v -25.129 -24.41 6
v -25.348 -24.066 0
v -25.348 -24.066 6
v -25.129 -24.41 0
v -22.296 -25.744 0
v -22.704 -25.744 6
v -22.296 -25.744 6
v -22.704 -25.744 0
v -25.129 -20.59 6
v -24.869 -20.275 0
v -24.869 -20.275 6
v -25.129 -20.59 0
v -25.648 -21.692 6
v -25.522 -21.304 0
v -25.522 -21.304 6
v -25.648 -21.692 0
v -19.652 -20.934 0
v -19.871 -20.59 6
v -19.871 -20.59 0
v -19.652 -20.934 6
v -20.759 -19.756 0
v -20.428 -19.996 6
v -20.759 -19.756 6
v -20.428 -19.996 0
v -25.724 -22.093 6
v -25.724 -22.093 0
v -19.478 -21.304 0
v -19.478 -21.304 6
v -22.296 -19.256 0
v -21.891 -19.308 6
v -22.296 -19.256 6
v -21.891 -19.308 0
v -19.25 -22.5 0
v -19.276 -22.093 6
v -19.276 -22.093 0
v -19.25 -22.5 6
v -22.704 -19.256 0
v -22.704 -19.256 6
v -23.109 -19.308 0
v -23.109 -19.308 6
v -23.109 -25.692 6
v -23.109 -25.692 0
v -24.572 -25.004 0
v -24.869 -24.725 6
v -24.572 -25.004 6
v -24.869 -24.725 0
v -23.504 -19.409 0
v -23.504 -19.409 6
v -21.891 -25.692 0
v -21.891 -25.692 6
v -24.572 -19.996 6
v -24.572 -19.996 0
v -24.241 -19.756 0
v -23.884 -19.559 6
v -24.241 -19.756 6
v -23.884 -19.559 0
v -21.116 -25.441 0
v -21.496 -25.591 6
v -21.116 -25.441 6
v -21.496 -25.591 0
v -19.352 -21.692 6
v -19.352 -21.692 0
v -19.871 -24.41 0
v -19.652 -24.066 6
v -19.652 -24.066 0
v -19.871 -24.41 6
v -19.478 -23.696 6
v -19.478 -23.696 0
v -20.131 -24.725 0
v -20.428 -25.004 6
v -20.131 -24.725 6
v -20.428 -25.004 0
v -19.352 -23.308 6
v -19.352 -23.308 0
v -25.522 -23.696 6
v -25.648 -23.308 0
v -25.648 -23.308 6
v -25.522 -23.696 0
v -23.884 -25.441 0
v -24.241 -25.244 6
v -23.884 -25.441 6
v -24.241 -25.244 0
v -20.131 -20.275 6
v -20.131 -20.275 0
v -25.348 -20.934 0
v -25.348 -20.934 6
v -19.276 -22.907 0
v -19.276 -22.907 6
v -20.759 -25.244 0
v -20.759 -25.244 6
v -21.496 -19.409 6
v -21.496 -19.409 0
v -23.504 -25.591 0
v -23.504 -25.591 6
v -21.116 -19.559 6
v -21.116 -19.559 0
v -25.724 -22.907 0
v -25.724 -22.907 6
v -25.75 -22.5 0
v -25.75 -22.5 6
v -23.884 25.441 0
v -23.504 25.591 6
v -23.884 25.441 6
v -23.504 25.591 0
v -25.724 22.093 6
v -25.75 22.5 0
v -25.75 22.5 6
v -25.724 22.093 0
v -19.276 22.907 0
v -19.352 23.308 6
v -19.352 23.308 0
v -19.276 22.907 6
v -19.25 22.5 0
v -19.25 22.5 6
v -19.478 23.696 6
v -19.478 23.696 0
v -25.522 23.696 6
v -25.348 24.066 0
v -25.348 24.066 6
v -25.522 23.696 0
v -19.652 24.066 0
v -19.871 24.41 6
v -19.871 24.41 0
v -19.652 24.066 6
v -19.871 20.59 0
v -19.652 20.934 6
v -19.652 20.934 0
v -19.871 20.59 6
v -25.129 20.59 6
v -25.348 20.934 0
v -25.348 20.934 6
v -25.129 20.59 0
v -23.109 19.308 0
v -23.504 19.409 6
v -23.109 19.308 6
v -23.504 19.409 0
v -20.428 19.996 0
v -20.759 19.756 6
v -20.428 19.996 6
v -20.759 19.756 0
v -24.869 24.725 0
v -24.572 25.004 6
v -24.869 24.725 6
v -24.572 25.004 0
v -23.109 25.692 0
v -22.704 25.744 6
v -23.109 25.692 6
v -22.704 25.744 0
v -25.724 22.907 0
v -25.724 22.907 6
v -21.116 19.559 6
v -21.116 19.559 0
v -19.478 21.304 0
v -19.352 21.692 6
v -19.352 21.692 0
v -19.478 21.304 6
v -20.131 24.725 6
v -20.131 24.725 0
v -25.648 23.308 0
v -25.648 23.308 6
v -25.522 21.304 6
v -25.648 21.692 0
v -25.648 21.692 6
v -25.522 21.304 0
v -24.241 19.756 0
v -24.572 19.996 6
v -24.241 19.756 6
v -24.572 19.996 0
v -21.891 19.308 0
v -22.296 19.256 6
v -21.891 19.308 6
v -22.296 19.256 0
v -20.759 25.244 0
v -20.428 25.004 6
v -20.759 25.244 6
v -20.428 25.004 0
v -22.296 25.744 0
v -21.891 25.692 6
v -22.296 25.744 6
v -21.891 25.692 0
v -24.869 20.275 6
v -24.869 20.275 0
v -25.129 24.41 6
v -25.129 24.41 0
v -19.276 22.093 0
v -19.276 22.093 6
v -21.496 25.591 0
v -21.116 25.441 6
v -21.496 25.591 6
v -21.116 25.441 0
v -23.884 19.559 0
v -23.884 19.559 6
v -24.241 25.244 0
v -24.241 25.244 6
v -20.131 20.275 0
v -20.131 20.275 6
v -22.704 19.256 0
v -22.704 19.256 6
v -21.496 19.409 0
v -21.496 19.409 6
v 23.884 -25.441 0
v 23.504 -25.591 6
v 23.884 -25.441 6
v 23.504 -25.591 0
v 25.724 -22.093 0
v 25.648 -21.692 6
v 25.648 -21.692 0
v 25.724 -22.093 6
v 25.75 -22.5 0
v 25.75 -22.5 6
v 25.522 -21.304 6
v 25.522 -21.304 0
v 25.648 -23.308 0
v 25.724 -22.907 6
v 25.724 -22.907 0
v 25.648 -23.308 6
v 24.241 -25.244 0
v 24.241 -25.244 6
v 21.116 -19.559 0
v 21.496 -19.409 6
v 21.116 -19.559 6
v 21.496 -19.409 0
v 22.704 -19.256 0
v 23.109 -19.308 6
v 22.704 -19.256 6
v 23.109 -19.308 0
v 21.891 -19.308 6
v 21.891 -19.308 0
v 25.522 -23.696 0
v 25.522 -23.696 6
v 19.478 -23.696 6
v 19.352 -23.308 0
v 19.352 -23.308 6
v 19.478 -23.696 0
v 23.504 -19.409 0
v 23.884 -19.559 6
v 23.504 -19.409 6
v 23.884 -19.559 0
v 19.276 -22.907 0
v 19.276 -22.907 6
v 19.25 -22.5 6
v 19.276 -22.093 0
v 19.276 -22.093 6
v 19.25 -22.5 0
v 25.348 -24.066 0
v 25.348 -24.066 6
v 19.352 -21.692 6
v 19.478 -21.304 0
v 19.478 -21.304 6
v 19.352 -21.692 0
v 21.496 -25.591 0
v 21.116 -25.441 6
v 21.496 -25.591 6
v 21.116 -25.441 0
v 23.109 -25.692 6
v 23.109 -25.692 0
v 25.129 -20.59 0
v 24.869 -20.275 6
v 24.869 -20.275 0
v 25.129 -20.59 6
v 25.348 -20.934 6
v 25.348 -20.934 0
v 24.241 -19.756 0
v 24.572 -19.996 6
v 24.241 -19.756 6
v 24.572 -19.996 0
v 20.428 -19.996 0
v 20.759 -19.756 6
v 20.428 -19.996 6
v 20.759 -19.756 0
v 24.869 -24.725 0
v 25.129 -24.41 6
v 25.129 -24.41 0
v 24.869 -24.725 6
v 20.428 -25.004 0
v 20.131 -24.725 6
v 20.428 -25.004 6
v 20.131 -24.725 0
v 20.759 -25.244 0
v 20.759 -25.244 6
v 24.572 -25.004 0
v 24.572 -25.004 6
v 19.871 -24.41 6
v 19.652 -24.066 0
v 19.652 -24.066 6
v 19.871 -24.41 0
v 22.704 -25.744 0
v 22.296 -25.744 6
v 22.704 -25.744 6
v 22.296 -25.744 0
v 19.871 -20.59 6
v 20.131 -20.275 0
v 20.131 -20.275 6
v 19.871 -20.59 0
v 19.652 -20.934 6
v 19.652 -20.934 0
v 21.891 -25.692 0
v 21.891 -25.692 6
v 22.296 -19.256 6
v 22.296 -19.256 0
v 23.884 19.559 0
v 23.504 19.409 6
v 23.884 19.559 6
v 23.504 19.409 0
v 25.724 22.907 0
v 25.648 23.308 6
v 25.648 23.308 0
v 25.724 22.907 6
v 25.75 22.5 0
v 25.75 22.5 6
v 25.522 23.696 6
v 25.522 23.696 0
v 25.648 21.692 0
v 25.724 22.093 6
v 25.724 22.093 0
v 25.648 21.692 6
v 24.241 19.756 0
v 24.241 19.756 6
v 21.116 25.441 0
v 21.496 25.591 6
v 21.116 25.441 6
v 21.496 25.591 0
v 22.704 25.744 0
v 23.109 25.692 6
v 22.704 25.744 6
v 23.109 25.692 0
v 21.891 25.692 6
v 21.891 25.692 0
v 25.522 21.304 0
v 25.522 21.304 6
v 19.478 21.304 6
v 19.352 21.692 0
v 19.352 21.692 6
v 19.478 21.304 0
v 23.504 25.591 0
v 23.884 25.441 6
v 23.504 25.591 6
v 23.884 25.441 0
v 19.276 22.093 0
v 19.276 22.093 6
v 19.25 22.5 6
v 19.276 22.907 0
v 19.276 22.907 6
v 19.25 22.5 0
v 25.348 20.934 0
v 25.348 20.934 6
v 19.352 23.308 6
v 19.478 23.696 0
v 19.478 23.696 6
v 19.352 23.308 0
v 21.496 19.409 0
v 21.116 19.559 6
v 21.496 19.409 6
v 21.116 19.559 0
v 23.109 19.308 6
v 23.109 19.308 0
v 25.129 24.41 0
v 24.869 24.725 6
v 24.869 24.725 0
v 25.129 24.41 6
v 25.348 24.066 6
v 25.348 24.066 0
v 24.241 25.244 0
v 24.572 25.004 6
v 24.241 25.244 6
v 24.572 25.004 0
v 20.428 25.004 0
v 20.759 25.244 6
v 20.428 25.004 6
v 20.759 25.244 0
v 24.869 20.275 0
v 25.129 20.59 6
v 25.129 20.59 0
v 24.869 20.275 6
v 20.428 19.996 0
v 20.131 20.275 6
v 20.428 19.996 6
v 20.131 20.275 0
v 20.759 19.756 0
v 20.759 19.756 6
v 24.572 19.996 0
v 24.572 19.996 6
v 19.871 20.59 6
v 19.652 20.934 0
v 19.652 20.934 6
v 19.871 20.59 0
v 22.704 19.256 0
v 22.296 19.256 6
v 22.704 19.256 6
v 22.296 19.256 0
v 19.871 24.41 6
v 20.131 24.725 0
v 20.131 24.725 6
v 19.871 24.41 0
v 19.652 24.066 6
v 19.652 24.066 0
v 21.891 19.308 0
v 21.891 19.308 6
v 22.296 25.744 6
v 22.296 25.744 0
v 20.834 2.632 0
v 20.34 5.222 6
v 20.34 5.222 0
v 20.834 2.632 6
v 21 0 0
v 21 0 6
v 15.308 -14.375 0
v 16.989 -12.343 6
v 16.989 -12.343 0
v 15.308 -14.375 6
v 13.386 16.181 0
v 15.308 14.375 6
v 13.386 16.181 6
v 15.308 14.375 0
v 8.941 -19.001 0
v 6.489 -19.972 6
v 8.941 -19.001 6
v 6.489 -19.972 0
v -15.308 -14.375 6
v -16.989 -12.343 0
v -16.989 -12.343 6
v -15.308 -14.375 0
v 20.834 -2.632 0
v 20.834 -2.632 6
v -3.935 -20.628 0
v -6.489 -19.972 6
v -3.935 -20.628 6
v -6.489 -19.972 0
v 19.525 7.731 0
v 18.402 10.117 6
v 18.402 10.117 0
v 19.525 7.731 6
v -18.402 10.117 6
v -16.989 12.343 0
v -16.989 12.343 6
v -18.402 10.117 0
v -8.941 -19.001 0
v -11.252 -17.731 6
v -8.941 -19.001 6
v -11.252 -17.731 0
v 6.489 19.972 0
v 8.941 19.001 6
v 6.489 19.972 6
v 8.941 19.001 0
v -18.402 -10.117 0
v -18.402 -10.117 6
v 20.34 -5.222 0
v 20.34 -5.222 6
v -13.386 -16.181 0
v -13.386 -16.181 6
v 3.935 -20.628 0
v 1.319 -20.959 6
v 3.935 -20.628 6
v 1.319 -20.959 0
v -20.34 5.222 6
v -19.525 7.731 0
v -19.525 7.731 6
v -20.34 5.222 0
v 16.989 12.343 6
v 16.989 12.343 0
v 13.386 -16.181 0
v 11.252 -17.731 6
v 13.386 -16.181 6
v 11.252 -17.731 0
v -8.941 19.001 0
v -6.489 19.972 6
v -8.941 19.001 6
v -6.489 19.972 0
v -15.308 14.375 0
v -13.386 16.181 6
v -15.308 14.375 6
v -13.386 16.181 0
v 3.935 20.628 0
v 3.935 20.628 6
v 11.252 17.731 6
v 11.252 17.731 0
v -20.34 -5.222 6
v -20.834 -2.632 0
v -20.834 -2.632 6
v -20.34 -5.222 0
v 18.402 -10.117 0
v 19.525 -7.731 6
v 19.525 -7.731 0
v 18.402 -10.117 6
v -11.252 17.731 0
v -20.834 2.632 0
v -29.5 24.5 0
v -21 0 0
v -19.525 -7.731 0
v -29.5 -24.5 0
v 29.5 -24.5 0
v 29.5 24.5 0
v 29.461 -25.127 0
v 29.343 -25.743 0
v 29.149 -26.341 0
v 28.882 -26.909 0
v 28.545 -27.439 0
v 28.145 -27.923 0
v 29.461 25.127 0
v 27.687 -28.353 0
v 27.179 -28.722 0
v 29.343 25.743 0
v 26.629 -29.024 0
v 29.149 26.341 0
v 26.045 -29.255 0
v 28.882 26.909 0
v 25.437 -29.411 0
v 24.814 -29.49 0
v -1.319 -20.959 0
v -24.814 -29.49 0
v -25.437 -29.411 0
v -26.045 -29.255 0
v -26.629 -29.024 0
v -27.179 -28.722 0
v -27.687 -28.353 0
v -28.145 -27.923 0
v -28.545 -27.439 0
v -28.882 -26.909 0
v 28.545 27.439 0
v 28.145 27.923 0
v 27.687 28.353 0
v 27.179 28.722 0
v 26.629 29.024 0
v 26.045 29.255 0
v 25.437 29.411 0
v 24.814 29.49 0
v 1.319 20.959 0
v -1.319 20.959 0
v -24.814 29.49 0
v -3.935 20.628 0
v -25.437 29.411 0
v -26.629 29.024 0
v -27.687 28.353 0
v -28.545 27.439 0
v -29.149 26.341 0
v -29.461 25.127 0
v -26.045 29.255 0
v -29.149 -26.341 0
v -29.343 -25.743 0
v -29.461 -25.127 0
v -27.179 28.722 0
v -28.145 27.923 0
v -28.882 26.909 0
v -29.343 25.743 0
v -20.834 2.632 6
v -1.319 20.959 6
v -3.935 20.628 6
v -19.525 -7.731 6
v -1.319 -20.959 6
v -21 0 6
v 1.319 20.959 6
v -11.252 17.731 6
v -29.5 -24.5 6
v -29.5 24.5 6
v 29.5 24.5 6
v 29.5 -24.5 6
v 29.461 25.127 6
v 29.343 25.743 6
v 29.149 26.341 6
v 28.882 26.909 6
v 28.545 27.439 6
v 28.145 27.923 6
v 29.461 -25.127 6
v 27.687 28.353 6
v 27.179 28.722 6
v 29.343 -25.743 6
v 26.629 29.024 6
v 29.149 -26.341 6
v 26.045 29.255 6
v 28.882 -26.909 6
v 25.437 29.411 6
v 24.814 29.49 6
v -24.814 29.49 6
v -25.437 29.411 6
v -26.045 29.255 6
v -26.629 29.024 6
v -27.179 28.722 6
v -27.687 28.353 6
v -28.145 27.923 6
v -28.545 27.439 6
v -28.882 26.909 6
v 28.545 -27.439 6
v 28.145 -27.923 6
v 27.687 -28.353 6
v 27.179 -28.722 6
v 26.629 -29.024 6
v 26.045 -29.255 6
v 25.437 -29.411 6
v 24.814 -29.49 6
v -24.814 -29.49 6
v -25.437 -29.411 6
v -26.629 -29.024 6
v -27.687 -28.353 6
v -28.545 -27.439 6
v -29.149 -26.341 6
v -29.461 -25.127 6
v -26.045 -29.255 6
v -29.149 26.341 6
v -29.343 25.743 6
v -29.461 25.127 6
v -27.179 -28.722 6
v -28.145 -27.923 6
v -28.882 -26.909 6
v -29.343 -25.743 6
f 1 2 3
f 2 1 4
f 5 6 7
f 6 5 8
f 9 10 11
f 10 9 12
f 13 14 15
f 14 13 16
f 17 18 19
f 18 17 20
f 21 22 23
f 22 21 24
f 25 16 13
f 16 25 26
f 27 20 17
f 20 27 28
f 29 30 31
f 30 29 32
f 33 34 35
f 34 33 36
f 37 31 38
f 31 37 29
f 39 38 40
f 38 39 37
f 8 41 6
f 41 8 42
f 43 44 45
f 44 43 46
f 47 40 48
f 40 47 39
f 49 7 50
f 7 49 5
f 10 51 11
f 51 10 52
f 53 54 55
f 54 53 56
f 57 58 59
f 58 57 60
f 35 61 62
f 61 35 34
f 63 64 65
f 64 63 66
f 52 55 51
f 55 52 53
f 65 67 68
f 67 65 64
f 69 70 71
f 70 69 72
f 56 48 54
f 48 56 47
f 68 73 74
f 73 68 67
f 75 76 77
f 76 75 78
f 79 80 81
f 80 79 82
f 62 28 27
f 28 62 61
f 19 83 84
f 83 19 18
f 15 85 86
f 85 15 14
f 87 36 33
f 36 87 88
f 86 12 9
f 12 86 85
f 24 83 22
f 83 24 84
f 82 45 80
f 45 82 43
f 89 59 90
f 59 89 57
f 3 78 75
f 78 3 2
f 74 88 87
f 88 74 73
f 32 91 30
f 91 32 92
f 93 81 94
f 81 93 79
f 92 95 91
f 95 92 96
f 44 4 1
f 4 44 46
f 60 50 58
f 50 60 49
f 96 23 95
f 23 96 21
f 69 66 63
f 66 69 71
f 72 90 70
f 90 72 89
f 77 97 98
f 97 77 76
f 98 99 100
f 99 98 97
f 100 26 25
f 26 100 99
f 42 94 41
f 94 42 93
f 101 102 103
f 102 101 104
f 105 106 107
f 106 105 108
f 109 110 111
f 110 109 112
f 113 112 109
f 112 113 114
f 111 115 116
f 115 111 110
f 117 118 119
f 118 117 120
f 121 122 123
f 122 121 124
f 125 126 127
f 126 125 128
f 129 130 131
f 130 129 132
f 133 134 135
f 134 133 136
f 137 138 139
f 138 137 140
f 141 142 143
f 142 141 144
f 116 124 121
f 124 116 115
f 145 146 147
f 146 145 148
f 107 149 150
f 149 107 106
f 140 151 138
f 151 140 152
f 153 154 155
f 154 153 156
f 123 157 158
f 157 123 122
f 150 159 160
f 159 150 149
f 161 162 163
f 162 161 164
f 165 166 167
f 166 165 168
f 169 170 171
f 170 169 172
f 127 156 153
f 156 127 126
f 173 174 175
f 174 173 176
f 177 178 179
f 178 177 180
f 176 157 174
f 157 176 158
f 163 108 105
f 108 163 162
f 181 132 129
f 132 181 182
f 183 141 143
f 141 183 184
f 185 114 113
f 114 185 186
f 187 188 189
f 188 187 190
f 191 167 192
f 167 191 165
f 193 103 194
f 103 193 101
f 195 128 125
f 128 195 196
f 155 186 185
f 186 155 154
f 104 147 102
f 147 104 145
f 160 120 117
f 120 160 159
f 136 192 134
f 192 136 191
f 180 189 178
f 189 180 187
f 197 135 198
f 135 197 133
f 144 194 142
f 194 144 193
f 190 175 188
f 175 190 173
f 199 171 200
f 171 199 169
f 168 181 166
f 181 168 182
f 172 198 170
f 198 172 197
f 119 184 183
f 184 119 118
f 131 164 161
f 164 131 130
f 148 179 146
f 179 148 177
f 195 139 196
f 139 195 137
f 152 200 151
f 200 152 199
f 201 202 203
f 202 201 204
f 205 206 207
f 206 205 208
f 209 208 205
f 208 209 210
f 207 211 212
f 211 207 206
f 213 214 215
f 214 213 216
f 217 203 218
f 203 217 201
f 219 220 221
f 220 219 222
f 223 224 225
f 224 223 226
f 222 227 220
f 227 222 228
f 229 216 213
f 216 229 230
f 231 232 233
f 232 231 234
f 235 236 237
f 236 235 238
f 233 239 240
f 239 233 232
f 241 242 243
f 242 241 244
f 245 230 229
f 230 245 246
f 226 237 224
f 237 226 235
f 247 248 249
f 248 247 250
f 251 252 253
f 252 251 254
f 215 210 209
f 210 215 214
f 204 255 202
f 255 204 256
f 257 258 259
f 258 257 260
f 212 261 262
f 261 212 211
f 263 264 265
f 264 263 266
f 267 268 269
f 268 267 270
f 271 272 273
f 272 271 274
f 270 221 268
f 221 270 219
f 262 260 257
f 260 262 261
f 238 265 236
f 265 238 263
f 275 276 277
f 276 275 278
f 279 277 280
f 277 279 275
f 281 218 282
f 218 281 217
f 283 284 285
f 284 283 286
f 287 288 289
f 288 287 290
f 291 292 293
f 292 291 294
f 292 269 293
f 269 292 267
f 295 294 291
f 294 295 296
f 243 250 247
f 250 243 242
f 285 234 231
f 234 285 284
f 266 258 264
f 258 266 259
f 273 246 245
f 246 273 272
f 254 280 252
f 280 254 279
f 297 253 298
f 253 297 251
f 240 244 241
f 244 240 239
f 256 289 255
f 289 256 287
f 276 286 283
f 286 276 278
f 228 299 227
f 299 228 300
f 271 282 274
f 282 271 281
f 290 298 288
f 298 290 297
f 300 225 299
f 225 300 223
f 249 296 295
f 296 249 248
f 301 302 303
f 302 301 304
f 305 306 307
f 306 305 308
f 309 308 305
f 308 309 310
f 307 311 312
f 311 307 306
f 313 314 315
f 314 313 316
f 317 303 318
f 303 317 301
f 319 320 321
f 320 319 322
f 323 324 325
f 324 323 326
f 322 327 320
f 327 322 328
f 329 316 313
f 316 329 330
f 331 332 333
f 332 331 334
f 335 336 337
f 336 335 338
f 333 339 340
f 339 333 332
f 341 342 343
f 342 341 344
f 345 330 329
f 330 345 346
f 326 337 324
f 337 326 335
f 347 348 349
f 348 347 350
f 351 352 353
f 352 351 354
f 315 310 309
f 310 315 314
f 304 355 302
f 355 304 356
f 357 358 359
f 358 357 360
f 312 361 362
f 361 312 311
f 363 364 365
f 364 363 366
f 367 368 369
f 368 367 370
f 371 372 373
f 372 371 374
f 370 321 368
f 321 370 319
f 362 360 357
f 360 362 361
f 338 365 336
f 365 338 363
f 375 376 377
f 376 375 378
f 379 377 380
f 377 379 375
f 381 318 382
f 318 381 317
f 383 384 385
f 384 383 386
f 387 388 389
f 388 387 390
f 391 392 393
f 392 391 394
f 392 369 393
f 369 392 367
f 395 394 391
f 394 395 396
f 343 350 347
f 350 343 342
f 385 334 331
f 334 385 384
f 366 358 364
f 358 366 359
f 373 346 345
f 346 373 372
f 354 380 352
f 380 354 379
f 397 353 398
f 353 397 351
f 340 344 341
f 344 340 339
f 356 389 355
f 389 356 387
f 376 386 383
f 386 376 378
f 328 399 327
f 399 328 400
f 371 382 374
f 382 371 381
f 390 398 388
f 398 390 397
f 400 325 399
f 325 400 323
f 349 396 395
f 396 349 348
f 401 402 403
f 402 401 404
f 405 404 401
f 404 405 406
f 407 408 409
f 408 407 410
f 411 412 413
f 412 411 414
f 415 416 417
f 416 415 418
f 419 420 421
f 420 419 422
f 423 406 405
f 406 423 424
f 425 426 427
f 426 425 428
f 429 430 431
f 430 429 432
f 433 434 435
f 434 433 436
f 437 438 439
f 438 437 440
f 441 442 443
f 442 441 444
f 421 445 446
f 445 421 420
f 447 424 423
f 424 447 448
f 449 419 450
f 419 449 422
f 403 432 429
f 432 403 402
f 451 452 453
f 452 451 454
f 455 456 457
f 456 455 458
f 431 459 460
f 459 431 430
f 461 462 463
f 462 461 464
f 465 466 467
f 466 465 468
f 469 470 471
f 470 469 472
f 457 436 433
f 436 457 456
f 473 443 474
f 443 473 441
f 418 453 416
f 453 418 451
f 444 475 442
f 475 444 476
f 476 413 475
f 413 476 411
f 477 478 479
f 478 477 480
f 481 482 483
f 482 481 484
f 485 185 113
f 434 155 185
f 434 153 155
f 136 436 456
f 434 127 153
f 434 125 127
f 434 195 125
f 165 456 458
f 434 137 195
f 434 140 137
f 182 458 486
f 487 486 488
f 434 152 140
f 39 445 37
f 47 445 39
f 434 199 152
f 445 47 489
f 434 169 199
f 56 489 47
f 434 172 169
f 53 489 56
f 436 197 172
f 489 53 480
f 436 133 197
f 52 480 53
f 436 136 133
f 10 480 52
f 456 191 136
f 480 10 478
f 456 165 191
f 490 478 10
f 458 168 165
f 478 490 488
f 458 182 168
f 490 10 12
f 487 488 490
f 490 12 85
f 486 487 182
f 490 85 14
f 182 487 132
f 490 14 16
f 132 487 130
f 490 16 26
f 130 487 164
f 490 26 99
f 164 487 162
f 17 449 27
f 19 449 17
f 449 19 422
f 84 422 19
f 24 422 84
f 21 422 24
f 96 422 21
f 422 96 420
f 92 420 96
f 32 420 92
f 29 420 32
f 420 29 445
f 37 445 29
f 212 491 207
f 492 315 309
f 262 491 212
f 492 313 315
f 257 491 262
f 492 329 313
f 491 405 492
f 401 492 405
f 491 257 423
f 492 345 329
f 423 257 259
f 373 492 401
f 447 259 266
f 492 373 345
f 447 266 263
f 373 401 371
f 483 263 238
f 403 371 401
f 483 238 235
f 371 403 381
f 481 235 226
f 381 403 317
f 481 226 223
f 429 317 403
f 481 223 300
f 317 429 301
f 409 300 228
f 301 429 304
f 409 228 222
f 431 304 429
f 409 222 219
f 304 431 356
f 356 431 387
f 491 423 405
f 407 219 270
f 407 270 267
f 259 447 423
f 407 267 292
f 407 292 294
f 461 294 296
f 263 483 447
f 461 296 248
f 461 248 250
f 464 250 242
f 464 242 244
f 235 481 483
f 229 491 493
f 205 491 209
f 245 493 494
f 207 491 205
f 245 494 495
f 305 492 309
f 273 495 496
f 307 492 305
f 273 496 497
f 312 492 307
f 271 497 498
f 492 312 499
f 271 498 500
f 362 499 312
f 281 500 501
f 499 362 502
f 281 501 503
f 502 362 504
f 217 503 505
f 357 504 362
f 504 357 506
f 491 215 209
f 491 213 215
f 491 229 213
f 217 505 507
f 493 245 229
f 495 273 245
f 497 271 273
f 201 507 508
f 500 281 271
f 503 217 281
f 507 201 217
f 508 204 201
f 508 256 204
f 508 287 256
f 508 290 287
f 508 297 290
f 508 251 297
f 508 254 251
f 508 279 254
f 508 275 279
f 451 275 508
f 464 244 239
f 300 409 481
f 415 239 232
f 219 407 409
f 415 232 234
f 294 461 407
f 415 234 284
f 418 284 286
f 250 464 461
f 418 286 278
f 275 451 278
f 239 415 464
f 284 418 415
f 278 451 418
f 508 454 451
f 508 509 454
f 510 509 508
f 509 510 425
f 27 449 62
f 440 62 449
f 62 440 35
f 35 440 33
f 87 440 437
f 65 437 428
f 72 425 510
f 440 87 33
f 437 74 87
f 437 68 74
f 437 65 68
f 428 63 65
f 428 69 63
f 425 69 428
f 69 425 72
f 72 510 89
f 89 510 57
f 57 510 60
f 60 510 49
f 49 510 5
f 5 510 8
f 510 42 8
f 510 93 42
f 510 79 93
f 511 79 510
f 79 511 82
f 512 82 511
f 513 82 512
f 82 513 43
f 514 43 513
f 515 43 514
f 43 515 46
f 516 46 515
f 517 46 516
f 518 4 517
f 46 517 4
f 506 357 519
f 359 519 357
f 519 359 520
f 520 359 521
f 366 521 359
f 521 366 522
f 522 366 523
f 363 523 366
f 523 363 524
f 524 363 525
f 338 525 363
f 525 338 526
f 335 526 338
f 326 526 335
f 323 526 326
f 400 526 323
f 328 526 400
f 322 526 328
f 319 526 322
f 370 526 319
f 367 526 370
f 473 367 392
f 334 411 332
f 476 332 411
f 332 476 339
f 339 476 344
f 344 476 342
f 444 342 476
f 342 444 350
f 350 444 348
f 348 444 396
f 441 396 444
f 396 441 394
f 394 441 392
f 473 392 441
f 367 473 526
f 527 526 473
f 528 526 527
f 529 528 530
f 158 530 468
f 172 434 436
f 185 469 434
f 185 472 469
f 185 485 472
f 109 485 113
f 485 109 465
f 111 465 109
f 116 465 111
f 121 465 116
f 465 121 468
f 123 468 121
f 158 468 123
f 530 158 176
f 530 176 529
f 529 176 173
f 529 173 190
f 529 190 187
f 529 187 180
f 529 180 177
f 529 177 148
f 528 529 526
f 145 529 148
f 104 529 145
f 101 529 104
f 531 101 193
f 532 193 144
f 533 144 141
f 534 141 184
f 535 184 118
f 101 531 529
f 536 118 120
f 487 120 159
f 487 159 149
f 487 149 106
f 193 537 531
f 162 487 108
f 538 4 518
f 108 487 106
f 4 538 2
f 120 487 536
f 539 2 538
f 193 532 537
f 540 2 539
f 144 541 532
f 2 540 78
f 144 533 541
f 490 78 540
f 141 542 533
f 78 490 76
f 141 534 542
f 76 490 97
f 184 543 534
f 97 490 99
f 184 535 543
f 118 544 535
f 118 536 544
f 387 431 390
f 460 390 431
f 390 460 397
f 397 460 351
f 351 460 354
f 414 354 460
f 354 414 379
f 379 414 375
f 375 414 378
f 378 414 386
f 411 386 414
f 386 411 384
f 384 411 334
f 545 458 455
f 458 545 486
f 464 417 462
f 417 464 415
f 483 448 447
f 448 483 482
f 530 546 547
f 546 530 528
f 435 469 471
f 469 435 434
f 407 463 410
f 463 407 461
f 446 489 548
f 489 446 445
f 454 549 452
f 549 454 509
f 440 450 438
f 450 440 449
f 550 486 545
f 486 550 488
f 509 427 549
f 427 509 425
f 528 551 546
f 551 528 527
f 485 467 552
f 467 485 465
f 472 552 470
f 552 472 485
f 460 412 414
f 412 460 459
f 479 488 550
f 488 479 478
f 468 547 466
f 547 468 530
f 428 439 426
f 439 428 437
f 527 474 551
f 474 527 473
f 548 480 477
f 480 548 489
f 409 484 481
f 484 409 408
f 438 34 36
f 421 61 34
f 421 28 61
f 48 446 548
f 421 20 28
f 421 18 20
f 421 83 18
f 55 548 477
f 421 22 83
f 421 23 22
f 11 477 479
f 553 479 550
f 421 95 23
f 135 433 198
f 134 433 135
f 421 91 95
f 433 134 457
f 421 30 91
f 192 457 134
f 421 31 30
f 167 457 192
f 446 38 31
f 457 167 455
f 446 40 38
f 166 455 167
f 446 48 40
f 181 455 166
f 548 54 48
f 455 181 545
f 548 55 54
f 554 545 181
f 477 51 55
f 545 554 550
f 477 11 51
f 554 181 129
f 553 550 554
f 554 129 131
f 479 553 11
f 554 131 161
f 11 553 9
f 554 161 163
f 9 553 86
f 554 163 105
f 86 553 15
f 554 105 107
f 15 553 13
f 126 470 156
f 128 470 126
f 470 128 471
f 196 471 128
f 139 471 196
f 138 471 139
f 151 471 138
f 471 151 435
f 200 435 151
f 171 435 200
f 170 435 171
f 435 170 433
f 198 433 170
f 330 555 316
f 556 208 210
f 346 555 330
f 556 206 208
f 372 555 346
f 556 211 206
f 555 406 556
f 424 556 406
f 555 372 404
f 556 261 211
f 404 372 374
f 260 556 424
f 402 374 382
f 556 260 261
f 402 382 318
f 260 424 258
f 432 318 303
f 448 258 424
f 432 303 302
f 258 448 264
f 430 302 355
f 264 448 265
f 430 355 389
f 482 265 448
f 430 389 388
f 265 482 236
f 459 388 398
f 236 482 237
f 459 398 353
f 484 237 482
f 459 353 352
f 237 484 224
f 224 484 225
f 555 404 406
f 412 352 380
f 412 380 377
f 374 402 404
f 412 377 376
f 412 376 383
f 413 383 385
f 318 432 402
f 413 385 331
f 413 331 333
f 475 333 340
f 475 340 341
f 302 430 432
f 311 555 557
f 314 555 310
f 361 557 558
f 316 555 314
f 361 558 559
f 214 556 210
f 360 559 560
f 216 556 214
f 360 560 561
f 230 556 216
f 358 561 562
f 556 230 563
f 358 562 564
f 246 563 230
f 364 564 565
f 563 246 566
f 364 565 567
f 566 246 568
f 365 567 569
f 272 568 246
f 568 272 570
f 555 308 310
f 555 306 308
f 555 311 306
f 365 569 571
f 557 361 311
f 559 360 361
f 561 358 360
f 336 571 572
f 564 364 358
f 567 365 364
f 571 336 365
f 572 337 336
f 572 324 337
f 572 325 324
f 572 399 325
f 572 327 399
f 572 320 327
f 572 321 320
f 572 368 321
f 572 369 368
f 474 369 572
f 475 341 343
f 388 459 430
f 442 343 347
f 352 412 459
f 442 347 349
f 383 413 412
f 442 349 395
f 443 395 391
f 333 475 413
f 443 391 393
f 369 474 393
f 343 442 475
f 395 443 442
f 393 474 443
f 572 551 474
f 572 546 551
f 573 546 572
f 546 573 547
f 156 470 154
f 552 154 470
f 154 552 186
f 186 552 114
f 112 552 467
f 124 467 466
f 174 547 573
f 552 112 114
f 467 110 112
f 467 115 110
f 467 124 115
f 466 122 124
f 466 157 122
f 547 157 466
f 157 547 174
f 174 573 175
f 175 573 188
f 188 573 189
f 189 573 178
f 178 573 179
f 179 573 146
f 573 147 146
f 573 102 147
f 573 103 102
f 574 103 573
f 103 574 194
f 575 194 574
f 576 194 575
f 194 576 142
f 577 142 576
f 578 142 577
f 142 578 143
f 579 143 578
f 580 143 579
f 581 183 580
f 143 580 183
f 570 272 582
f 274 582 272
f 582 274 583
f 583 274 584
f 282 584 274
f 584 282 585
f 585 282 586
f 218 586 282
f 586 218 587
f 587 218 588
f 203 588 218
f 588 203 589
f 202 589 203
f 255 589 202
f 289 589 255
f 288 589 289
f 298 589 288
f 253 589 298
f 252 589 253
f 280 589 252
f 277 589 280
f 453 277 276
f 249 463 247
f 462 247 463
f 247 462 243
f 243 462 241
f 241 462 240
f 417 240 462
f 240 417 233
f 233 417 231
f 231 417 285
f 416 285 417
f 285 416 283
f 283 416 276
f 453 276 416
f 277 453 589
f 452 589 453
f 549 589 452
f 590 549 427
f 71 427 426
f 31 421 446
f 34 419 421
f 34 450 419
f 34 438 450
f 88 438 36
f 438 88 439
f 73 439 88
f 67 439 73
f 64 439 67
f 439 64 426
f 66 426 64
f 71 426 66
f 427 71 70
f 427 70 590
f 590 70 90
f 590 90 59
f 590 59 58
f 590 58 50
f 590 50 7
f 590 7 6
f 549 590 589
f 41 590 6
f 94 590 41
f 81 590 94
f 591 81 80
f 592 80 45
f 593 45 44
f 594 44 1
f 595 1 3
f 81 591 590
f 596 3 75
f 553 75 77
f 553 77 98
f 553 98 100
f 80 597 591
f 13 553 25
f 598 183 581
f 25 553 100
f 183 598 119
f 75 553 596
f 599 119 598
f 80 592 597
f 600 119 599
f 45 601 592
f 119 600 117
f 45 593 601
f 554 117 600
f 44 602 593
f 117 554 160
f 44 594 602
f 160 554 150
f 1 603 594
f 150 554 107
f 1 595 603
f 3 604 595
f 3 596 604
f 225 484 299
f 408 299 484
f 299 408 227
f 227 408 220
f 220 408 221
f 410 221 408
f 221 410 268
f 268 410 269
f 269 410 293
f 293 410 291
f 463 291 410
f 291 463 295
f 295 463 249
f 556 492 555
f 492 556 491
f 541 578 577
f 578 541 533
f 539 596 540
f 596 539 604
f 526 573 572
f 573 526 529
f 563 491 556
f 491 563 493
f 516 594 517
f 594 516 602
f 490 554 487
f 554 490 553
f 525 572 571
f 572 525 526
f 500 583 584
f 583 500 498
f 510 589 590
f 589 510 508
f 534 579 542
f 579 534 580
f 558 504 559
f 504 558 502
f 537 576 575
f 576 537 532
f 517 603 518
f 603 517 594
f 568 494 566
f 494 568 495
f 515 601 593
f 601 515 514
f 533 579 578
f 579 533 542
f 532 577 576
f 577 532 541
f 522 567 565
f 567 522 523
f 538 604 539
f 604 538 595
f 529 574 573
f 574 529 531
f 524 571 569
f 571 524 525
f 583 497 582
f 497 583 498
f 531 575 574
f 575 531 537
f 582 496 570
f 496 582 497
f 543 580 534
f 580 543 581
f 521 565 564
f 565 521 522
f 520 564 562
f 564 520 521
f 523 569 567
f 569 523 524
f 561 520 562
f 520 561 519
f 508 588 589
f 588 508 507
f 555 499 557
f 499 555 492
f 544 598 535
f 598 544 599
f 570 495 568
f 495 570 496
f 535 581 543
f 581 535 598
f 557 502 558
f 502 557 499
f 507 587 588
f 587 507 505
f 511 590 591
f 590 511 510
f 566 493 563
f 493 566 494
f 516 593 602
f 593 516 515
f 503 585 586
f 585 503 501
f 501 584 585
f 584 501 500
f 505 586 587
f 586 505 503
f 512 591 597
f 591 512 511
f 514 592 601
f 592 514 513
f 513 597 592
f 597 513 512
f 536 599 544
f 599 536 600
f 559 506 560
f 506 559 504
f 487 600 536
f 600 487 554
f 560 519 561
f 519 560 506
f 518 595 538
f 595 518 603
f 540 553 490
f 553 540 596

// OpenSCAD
$fn = 50;


difference() {
	union() {
		hull() {
			translate(v = [-24.5000000000, 24.5000000000, 0]) {
				cylinder(h = 6, r = 5);
			}
			translate(v = [24.5000000000, 24.5000000000, 0]) {
				cylinder(h = 6, r = 5);
			}
			translate(v = [-24.5000000000, -24.5000000000, 0]) {
				cylinder(h = 6, r = 5);
			}
			translate(v = [24.5000000000, -24.5000000000, 0]) {
				cylinder(h = 6, r = 5);
			}
		}
	}
	union() {
		#translate(v = [-22.5000000000, -22.5000000000, -100.0000000000]) {
			cylinder(h = 200, r = 3.2500000000);
		}
		#translate(v = [-22.5000000000, 22.5000000000, -100.0000000000]) {
			cylinder(h = 200, r = 3.2500000000);
		}
		#translate(v = [22.5000000000, -22.5000000000, -100.0000000000]) {
			cylinder(h = 200, r = 3.2500000000);
		}
		#translate(v = [22.5000000000, 22.5000000000, -100.0000000000]) {
			cylinder(h = 200, r = 3.2500000000);
		}
		#cylinder(h = 6, r = 21.0000000000);
	}
}
